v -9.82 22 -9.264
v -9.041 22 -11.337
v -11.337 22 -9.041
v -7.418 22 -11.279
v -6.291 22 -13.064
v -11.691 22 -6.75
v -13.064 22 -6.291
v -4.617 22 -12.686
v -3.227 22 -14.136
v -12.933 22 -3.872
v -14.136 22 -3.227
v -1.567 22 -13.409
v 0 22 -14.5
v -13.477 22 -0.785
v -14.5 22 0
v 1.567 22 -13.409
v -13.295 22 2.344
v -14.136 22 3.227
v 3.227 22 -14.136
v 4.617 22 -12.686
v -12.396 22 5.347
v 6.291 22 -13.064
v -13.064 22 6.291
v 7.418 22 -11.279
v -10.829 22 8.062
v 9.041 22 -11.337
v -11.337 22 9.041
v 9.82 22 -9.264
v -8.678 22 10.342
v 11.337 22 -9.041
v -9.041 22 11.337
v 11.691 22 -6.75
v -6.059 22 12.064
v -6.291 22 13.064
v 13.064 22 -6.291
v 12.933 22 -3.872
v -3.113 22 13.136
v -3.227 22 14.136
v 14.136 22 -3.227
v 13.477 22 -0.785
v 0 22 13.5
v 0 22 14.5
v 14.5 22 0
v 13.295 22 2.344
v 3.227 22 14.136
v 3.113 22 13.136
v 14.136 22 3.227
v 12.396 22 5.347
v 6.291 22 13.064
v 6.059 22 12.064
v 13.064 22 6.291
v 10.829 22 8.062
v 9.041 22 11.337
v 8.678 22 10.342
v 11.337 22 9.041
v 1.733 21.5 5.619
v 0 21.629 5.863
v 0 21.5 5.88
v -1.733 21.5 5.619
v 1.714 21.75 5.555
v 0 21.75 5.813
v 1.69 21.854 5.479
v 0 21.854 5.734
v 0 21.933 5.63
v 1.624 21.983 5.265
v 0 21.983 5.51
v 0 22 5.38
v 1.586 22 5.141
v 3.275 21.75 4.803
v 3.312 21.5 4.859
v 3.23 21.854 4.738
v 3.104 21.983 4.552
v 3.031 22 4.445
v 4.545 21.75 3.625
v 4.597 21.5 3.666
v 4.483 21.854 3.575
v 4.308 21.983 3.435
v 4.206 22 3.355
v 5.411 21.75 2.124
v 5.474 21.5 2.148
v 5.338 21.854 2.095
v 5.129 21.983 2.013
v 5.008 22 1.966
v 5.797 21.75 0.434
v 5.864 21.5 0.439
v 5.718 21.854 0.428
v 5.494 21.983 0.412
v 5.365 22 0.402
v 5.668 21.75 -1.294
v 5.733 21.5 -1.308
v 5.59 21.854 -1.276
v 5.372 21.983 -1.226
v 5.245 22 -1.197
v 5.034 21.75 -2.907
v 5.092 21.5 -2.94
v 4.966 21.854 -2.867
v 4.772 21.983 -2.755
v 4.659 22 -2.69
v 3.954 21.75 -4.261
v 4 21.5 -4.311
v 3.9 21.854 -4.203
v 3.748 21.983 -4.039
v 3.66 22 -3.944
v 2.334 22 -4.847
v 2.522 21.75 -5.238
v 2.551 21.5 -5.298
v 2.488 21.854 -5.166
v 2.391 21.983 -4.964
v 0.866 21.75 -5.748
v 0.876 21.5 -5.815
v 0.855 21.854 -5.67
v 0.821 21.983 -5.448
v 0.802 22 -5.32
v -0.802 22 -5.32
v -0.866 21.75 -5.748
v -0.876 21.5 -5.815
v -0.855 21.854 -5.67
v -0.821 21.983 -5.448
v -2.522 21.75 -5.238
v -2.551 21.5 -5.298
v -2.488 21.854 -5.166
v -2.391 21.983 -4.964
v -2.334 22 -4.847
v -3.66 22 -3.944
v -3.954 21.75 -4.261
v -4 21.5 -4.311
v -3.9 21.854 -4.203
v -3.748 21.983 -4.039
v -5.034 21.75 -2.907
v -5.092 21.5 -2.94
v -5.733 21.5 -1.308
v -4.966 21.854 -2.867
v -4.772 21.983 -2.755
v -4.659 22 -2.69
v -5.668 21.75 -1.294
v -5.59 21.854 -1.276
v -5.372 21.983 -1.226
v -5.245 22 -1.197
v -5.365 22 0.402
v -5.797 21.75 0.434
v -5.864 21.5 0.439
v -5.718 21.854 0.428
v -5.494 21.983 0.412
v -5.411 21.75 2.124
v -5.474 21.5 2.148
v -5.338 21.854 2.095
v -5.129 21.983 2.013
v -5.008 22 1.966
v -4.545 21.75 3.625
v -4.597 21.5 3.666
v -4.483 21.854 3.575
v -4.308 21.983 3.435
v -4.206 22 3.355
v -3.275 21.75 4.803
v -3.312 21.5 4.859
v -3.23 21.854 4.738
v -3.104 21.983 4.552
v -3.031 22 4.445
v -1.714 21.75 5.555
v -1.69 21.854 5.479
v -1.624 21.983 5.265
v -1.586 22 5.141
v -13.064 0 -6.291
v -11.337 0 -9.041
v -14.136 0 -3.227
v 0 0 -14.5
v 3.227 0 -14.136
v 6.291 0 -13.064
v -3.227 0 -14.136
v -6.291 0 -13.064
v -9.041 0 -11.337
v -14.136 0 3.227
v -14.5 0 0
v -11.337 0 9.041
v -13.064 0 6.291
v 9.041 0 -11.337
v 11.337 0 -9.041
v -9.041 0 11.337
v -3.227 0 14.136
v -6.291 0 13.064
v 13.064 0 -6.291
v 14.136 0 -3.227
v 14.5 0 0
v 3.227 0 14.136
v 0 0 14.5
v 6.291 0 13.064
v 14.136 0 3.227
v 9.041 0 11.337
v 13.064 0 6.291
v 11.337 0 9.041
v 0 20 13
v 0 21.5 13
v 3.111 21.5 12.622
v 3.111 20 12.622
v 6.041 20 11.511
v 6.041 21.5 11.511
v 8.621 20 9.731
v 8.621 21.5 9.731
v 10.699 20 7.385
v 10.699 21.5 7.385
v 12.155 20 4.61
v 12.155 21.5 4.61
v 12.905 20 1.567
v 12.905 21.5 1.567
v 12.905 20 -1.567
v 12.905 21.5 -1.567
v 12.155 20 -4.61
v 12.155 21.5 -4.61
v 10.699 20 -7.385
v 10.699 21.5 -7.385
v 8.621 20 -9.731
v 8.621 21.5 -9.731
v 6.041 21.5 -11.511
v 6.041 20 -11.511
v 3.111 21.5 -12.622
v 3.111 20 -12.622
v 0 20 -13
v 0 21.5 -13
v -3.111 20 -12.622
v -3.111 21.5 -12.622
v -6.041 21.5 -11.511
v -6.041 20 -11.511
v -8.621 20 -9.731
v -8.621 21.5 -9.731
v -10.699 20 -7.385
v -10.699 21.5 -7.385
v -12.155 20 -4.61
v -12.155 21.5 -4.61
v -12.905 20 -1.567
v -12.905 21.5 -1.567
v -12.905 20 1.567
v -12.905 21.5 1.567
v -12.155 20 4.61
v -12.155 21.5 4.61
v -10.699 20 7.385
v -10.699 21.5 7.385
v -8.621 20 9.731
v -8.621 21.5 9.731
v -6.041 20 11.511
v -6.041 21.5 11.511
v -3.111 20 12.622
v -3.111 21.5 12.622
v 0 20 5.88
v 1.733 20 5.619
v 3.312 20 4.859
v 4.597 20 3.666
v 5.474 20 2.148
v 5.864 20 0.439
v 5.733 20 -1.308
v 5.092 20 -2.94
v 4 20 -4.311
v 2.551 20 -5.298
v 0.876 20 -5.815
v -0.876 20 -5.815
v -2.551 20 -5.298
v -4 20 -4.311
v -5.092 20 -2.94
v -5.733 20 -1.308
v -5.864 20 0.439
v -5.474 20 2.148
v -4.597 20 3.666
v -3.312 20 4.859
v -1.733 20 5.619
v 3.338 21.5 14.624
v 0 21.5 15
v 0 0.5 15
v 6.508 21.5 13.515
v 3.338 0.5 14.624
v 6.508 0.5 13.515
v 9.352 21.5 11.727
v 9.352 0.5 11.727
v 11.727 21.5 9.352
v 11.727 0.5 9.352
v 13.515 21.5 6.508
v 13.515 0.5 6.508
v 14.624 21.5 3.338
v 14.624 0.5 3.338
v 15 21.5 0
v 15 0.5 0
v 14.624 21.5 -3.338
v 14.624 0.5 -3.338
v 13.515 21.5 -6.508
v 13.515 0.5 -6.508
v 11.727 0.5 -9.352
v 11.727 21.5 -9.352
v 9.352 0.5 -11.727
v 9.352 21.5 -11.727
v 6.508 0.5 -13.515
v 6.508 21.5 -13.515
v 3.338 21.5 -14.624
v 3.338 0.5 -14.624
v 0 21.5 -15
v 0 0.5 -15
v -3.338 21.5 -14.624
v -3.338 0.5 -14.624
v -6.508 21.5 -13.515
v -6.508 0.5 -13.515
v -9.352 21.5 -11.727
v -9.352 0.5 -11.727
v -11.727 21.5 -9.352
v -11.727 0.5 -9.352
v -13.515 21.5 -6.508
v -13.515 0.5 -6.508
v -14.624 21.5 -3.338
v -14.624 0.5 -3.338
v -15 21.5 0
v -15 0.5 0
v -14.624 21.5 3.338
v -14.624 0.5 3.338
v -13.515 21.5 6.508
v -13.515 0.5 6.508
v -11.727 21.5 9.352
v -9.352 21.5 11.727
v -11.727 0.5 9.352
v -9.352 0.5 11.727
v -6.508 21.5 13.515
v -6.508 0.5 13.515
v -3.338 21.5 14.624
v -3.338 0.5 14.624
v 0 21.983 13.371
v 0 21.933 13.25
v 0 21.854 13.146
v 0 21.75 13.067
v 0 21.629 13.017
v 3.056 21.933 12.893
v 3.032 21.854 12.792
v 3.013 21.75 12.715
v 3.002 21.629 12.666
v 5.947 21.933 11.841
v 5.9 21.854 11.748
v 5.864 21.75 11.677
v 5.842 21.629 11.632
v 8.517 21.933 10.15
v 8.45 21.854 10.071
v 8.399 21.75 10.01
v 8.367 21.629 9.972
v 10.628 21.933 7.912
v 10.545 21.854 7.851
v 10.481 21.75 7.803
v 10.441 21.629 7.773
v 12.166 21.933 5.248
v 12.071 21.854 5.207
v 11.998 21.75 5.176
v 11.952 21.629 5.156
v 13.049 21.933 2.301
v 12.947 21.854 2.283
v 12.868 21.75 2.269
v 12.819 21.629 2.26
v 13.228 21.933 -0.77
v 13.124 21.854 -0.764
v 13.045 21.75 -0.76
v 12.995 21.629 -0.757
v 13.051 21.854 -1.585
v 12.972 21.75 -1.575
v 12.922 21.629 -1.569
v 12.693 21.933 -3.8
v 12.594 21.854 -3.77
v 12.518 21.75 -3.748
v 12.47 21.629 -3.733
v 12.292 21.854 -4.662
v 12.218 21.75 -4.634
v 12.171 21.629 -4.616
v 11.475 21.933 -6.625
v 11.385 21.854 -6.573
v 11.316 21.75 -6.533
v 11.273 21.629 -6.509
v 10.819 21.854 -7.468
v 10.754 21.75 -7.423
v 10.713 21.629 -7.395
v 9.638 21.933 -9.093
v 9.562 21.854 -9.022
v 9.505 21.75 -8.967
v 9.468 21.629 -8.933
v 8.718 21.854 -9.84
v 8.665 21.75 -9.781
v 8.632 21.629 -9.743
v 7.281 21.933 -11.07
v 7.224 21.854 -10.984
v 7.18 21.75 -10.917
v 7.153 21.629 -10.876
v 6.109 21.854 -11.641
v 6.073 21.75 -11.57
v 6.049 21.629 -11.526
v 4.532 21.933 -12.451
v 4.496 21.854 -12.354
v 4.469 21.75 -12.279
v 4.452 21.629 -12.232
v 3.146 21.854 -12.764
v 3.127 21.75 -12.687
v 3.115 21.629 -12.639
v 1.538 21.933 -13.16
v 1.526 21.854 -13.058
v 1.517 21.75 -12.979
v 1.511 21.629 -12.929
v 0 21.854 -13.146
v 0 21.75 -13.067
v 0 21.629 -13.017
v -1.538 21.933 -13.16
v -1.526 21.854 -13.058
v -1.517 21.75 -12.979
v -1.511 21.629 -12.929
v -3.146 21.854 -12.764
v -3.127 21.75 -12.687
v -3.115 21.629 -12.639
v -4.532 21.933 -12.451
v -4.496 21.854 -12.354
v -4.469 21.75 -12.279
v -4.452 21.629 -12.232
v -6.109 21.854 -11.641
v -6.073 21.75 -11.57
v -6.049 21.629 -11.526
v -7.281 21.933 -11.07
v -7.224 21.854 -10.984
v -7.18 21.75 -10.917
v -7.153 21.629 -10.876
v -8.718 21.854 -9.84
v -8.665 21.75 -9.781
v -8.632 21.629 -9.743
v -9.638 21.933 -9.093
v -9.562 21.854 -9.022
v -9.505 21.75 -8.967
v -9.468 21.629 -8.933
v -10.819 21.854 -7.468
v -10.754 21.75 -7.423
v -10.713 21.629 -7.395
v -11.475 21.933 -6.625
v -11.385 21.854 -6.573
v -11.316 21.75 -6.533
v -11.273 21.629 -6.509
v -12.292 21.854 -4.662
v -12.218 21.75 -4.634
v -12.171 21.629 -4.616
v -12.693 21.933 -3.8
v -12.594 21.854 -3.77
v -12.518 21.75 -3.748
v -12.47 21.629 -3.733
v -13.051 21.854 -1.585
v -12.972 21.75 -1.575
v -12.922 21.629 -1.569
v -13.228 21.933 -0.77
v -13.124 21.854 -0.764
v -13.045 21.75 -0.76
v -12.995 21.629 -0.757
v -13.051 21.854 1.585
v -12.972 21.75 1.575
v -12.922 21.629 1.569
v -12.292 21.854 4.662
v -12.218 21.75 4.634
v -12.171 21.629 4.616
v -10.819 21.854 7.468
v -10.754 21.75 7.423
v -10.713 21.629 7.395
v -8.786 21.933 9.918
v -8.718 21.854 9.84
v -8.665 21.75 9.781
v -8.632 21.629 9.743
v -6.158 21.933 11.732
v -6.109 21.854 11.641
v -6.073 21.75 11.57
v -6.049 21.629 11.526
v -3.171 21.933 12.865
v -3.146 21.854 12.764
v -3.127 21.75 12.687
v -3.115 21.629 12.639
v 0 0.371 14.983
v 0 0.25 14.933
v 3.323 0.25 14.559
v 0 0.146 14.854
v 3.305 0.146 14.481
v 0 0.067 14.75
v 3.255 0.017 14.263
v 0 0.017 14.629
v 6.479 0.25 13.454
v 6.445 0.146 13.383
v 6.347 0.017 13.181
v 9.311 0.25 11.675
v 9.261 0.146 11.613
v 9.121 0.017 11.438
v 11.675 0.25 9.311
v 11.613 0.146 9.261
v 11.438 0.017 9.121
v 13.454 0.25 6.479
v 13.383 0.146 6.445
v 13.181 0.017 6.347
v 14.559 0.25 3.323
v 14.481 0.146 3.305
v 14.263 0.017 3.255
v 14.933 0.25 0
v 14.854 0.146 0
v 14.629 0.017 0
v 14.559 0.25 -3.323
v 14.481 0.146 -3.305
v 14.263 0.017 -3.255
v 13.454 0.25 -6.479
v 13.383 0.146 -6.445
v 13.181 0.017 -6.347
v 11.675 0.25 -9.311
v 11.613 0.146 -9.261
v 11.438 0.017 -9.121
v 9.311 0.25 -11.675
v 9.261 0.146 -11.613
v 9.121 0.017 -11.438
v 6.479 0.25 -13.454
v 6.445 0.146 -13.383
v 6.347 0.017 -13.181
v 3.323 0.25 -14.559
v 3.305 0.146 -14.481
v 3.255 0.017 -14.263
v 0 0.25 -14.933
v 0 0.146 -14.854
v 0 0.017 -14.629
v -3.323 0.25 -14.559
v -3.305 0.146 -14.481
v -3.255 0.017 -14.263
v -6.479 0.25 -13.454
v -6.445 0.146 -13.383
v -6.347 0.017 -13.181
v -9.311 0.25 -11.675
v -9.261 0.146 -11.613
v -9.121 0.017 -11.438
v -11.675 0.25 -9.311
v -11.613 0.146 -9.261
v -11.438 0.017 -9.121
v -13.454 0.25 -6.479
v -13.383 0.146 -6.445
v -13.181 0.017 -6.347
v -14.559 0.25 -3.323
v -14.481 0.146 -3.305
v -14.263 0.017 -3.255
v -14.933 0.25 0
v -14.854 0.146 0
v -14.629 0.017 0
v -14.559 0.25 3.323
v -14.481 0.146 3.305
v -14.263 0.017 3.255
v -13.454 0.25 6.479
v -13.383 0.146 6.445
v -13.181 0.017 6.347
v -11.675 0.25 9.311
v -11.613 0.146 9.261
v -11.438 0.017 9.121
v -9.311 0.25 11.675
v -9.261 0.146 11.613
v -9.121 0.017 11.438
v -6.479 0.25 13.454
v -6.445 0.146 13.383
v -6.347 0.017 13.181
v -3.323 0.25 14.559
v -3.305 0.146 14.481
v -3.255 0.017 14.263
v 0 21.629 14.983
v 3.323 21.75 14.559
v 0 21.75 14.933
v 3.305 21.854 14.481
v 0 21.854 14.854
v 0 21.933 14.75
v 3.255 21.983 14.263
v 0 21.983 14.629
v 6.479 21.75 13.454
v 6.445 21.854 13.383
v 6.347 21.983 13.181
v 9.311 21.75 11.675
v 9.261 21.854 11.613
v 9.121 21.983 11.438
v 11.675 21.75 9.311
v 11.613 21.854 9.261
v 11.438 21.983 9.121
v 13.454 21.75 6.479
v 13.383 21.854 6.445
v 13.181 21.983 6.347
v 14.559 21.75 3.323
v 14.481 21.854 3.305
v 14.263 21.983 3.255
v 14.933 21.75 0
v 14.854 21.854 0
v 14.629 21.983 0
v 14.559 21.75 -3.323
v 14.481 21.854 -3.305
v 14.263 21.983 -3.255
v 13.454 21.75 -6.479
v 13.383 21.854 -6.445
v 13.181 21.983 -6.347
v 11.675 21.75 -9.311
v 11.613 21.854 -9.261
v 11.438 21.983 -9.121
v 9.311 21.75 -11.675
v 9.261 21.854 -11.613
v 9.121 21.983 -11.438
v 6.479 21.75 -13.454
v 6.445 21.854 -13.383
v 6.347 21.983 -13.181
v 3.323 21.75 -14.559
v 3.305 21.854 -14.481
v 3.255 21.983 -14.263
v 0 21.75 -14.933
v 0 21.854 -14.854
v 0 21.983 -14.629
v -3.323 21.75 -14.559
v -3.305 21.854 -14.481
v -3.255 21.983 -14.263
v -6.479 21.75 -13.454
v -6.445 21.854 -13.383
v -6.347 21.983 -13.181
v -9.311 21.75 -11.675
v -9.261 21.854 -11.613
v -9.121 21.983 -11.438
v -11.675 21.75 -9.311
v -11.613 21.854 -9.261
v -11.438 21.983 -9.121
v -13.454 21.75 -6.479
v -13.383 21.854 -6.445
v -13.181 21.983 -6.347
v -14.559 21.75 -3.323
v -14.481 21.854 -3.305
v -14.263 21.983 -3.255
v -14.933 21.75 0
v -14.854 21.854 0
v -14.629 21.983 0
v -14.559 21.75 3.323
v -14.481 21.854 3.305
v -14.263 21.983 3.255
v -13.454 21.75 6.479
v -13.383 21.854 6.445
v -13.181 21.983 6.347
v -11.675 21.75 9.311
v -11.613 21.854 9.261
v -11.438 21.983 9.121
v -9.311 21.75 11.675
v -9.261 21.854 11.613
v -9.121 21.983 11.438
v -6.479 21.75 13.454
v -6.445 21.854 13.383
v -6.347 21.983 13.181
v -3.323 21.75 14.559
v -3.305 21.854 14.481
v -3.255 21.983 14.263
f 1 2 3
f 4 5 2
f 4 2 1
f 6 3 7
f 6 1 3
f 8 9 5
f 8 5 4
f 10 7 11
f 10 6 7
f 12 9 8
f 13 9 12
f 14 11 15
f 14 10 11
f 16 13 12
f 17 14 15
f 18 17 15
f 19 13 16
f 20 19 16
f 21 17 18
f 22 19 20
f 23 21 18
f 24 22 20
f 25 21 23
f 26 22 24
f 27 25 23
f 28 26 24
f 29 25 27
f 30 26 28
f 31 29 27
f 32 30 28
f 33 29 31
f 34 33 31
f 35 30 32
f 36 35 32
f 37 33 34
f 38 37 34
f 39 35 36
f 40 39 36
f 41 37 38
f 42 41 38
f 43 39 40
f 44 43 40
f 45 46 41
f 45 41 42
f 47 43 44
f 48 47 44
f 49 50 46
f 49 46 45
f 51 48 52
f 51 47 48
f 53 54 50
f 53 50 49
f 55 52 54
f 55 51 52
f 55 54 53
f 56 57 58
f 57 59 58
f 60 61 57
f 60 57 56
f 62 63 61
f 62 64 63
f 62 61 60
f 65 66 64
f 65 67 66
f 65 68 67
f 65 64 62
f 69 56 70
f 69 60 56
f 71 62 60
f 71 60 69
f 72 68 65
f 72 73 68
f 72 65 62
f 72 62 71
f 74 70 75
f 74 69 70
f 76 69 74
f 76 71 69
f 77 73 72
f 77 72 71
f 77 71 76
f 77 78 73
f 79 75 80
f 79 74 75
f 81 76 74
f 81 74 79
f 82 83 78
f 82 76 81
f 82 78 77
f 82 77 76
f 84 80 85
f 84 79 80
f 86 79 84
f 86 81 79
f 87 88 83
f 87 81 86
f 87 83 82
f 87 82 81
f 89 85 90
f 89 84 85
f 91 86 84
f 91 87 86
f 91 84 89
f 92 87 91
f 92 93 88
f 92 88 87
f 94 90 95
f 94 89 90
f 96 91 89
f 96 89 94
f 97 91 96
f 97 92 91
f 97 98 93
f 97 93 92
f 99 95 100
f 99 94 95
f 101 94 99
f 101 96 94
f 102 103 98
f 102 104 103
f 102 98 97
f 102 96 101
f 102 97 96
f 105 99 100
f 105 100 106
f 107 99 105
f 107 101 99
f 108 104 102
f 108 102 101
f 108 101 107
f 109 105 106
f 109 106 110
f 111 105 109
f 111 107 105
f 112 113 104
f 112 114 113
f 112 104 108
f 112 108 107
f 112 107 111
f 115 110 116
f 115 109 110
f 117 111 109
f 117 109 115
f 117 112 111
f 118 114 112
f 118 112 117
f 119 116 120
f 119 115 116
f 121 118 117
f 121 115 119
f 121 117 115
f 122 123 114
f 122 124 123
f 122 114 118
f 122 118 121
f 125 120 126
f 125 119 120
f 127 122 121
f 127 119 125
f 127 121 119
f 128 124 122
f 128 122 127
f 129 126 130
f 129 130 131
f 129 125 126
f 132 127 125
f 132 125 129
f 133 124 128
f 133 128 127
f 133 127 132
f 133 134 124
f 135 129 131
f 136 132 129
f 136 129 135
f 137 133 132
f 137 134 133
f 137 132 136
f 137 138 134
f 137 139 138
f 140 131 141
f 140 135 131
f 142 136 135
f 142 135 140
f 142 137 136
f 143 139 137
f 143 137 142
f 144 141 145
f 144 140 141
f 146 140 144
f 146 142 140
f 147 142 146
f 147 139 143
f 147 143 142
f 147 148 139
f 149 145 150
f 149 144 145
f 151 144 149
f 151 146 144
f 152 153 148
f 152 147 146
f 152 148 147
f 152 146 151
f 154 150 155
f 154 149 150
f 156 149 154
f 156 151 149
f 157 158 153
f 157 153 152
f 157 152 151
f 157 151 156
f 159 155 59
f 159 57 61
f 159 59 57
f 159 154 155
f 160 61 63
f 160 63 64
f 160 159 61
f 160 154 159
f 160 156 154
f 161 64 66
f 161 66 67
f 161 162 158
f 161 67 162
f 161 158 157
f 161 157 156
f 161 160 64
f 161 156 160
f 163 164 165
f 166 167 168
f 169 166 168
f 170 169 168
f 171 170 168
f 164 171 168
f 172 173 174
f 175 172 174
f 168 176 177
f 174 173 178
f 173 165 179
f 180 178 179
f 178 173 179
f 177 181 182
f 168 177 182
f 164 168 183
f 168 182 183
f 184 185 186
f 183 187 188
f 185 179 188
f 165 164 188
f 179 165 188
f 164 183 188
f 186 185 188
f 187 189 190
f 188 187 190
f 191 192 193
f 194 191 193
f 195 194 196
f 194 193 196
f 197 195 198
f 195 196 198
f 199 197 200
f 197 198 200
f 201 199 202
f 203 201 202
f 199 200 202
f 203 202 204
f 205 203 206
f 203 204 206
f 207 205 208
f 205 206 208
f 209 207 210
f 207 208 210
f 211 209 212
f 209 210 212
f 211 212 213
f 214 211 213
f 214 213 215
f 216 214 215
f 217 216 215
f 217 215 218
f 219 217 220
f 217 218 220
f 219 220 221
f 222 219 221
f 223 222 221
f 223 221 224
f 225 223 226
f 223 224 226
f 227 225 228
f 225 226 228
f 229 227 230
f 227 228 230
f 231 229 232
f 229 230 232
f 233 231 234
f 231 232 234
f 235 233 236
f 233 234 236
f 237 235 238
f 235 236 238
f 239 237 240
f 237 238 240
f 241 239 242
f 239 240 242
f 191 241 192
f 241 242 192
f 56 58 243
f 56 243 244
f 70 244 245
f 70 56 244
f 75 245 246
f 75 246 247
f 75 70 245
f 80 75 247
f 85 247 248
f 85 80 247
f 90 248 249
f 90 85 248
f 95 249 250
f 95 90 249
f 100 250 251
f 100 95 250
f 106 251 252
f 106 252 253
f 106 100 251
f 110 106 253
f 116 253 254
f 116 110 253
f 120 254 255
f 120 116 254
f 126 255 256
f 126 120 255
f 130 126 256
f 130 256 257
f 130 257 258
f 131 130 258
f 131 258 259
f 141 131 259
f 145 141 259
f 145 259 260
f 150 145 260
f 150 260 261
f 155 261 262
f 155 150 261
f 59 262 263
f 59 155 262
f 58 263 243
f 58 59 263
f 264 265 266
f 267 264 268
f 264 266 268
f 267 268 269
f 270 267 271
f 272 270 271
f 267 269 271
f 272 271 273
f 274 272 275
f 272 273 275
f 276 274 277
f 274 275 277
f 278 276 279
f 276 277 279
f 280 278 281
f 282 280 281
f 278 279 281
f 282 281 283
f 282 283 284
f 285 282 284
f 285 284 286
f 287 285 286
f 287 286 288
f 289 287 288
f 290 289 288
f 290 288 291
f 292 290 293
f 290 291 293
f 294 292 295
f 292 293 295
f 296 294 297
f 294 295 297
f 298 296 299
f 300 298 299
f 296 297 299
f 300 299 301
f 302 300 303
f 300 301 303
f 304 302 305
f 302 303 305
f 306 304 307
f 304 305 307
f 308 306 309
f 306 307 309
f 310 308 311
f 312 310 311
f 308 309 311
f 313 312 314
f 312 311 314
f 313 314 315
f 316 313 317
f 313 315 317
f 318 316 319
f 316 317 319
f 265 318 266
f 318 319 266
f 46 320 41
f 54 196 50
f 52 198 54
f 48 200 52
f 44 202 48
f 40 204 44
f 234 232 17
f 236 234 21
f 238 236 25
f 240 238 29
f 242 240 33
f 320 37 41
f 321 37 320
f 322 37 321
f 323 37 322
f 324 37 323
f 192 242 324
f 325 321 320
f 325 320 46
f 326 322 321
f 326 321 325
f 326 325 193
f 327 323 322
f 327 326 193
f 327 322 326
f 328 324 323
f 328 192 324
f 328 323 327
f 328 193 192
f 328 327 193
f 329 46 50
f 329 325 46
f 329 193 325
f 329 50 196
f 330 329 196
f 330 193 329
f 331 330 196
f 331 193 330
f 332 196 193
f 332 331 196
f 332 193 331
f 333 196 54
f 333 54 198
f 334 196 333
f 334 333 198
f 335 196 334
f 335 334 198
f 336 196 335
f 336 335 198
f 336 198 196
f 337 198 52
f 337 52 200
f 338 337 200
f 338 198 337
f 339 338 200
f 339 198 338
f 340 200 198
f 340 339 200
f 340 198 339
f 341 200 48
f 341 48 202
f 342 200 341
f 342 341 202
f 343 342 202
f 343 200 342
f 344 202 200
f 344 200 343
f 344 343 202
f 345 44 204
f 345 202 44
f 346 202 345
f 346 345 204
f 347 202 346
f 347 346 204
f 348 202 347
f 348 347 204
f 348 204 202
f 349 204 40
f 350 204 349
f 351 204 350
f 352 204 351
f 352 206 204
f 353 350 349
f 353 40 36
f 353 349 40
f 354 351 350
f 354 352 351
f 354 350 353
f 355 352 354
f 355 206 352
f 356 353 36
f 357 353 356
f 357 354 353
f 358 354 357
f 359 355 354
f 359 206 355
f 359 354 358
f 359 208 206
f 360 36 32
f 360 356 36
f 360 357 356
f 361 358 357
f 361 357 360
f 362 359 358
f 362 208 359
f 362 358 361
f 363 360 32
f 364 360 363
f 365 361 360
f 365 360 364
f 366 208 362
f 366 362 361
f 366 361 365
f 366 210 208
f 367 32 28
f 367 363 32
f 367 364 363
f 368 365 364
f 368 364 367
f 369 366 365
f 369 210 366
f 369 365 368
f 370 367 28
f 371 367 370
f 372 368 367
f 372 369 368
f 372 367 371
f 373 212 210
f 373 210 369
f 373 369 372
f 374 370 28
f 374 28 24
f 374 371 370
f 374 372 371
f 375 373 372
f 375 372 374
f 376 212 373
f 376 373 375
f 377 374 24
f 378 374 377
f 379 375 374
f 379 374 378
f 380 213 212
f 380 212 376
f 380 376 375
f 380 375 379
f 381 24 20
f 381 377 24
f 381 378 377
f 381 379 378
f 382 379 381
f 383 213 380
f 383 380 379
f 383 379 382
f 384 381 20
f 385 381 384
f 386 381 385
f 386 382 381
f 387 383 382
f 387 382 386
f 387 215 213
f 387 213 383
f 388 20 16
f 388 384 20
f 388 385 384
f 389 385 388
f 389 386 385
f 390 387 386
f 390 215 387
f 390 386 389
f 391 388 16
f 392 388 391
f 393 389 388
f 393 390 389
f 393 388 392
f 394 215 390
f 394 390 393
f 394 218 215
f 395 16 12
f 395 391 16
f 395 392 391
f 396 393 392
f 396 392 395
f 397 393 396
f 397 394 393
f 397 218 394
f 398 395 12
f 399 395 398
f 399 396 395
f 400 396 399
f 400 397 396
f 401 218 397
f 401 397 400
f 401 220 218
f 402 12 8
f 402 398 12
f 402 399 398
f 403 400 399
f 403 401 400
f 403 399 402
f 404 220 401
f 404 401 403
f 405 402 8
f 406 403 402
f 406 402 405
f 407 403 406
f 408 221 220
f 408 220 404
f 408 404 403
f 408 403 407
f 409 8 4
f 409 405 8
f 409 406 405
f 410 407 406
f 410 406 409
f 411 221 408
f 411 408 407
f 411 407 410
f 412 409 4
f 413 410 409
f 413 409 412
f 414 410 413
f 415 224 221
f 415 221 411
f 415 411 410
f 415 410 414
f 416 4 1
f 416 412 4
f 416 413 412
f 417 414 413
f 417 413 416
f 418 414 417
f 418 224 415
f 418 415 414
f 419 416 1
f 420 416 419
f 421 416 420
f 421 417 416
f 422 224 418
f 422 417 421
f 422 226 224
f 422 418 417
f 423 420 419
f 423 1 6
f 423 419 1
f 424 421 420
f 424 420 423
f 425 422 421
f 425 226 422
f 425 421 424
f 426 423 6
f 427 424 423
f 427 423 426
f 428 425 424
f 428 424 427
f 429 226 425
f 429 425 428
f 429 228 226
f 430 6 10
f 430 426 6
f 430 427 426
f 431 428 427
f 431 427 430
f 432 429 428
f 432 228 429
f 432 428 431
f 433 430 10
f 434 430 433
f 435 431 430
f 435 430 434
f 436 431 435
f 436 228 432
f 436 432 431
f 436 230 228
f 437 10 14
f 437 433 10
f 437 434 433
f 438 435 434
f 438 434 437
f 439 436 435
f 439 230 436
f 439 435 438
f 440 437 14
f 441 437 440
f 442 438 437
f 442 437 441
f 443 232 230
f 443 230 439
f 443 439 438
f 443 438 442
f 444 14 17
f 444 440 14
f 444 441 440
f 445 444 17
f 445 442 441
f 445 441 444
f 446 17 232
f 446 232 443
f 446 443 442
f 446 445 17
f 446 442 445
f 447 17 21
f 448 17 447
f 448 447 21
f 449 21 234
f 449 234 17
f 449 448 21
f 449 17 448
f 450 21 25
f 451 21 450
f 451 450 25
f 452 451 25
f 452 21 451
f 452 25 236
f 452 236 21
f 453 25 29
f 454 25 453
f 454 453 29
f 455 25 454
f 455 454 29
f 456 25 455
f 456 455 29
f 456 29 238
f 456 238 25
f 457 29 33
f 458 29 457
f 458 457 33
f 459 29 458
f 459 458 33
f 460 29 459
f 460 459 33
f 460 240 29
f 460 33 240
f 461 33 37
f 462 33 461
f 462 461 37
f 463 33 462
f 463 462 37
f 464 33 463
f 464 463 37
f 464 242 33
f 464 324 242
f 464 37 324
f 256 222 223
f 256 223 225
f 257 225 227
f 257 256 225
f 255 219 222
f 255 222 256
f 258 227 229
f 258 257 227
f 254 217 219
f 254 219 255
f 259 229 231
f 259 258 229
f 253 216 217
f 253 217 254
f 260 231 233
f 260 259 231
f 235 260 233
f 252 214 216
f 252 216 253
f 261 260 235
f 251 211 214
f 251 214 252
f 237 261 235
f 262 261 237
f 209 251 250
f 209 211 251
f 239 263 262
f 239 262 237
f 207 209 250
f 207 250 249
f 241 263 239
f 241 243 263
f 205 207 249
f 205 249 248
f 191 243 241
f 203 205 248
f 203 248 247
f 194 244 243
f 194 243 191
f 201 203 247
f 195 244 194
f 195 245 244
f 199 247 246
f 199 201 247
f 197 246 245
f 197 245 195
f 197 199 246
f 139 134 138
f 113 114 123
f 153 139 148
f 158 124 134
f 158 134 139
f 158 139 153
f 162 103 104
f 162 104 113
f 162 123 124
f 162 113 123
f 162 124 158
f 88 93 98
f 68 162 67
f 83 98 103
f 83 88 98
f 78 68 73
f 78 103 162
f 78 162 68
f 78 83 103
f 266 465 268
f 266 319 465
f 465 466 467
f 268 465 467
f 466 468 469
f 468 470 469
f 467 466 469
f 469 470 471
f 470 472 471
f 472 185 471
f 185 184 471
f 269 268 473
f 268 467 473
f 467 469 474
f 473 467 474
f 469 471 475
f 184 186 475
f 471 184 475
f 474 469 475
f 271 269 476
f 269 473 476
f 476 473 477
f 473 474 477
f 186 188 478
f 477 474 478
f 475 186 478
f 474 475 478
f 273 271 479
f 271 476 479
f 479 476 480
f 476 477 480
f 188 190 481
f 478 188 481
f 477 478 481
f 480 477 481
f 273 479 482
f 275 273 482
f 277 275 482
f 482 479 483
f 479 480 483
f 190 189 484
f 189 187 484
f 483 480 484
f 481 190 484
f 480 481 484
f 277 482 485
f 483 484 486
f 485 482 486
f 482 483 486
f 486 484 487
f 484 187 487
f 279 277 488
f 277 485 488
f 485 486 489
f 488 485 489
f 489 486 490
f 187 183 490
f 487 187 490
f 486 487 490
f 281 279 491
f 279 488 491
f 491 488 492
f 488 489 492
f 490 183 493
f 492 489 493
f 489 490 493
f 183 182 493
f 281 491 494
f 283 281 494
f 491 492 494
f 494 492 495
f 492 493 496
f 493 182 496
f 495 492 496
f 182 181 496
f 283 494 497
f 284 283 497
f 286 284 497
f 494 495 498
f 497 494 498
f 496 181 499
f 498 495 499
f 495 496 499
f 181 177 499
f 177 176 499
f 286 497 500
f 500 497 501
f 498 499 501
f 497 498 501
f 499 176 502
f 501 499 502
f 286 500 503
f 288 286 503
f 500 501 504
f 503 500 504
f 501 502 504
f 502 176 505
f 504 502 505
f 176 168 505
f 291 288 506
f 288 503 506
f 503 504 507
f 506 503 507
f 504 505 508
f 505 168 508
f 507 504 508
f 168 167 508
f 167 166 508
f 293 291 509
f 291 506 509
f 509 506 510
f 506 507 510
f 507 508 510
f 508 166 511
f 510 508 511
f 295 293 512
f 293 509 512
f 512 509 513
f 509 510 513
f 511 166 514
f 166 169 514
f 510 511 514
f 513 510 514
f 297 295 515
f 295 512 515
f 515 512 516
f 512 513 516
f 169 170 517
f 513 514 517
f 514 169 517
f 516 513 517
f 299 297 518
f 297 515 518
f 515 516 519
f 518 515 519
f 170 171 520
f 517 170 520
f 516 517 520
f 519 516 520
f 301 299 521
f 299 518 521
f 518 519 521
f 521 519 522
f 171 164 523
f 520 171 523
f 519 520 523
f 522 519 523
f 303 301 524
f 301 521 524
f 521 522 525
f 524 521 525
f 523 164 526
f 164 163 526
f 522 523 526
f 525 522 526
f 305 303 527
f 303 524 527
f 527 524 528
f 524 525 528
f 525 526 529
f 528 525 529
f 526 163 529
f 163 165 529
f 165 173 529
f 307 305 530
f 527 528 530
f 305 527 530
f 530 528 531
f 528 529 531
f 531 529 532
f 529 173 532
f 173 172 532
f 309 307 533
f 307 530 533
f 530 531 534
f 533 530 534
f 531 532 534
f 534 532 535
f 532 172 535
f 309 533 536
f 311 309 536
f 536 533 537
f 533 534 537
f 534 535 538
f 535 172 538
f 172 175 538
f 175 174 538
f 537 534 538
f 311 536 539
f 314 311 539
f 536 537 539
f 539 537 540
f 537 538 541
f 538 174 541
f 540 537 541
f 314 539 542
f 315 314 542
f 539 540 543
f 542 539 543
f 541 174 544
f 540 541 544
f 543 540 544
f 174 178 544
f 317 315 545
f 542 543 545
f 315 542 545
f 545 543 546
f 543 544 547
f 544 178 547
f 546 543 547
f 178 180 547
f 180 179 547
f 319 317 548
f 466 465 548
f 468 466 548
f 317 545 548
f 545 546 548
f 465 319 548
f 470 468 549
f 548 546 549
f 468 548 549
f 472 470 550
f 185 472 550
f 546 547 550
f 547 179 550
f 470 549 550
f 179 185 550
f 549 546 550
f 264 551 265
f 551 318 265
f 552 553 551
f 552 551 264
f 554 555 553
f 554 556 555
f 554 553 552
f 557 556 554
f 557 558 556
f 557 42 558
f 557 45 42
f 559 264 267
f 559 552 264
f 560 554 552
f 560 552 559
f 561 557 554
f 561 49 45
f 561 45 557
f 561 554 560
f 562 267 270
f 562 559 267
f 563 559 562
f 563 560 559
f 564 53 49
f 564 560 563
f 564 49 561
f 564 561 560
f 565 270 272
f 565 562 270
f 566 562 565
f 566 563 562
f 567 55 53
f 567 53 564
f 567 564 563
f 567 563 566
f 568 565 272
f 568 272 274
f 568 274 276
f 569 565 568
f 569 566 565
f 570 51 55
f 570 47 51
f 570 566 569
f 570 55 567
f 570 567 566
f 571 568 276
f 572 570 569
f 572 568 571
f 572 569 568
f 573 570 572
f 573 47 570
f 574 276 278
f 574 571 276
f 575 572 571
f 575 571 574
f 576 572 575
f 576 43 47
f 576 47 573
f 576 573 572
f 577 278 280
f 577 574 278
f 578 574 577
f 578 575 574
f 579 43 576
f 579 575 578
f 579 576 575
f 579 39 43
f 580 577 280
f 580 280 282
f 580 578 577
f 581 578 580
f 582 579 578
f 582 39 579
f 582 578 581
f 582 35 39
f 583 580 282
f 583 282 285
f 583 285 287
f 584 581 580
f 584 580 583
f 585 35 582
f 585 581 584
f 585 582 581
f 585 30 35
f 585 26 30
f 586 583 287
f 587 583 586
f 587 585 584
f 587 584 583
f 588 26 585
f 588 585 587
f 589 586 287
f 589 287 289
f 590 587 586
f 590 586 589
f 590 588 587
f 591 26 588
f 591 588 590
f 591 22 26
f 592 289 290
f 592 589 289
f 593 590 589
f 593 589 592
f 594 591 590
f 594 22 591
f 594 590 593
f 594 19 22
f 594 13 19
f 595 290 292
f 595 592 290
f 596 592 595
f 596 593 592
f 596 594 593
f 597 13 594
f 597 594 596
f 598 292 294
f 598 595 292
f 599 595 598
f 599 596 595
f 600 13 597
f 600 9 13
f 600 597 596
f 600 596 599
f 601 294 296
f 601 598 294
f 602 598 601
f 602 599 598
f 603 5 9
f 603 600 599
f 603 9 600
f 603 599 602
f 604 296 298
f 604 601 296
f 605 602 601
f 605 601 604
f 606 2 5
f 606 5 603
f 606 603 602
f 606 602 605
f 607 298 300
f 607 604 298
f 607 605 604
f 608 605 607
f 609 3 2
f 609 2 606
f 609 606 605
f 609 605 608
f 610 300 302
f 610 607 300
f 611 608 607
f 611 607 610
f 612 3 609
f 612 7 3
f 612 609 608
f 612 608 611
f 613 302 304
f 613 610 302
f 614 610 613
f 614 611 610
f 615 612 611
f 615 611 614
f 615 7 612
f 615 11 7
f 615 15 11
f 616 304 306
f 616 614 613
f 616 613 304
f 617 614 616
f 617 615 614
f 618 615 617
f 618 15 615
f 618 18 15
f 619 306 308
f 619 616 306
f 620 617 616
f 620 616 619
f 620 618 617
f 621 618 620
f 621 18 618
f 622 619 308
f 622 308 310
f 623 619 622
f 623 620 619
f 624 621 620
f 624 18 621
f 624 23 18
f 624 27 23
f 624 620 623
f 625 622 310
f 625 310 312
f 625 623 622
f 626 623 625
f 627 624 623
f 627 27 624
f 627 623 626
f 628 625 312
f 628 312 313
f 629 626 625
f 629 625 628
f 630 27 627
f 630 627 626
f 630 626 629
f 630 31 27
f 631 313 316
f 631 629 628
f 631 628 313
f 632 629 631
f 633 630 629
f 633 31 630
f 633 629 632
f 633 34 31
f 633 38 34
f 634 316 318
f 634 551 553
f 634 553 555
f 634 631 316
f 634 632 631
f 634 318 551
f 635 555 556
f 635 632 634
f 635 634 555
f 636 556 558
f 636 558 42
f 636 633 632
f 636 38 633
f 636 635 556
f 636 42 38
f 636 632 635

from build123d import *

# Parameters (mm, degrees)
SKETCH1_R           = 15
BOSS_EXTRUDE1_DEPTH = 22
SKETCH2_R           = 13
SKETCH2_R_2         = 5.88031104
CUT_EXTRUDE1_DEPTH  = 2
FILLET1_R           = 0.5


with BuildPart() as part:
    # Sketch1 → Boss-Extrude1 (new body)
    with BuildSketch(Plane(origin=(0, 0, 0), x_dir=(1, 0, 0), z_dir=(0, 1, 0))):
        with Locations(Location((0, 0, 0), (0, 0, 270))):
            Circle(SKETCH1_R)
    extrude(amount=BOSS_EXTRUDE1_DEPTH)

    # Sketch2 → Cut-Extrude1 (cut)
    with BuildSketch(Plane(origin=(0, 22, 0), x_dir=(1, 0, 0), z_dir=(0, 1, 0))):
        with Locations(Location((0, 0, 0), (0, 0, 270))):
            Circle(SKETCH2_R)
        with Locations(Location((0, 0, 0), (0, 0, 270))):
            Circle(SKETCH2_R_2, mode=Mode.SUBTRACT)
    extrude(amount=-CUT_EXTRUDE1_DEPTH, mode=Mode.SUBTRACT)

    # Fillet1
    fillet1_edges = [part.edges().sort_by_distance(p)[0] for p in [
        (0, 0, -15),
        (0, 22, -15),
        (0, 22, -13),
        (0, 22, -5.88031104),
    ]]
    fillet(fillet1_edges, radius=FILLET1_R)


solid = part.part
